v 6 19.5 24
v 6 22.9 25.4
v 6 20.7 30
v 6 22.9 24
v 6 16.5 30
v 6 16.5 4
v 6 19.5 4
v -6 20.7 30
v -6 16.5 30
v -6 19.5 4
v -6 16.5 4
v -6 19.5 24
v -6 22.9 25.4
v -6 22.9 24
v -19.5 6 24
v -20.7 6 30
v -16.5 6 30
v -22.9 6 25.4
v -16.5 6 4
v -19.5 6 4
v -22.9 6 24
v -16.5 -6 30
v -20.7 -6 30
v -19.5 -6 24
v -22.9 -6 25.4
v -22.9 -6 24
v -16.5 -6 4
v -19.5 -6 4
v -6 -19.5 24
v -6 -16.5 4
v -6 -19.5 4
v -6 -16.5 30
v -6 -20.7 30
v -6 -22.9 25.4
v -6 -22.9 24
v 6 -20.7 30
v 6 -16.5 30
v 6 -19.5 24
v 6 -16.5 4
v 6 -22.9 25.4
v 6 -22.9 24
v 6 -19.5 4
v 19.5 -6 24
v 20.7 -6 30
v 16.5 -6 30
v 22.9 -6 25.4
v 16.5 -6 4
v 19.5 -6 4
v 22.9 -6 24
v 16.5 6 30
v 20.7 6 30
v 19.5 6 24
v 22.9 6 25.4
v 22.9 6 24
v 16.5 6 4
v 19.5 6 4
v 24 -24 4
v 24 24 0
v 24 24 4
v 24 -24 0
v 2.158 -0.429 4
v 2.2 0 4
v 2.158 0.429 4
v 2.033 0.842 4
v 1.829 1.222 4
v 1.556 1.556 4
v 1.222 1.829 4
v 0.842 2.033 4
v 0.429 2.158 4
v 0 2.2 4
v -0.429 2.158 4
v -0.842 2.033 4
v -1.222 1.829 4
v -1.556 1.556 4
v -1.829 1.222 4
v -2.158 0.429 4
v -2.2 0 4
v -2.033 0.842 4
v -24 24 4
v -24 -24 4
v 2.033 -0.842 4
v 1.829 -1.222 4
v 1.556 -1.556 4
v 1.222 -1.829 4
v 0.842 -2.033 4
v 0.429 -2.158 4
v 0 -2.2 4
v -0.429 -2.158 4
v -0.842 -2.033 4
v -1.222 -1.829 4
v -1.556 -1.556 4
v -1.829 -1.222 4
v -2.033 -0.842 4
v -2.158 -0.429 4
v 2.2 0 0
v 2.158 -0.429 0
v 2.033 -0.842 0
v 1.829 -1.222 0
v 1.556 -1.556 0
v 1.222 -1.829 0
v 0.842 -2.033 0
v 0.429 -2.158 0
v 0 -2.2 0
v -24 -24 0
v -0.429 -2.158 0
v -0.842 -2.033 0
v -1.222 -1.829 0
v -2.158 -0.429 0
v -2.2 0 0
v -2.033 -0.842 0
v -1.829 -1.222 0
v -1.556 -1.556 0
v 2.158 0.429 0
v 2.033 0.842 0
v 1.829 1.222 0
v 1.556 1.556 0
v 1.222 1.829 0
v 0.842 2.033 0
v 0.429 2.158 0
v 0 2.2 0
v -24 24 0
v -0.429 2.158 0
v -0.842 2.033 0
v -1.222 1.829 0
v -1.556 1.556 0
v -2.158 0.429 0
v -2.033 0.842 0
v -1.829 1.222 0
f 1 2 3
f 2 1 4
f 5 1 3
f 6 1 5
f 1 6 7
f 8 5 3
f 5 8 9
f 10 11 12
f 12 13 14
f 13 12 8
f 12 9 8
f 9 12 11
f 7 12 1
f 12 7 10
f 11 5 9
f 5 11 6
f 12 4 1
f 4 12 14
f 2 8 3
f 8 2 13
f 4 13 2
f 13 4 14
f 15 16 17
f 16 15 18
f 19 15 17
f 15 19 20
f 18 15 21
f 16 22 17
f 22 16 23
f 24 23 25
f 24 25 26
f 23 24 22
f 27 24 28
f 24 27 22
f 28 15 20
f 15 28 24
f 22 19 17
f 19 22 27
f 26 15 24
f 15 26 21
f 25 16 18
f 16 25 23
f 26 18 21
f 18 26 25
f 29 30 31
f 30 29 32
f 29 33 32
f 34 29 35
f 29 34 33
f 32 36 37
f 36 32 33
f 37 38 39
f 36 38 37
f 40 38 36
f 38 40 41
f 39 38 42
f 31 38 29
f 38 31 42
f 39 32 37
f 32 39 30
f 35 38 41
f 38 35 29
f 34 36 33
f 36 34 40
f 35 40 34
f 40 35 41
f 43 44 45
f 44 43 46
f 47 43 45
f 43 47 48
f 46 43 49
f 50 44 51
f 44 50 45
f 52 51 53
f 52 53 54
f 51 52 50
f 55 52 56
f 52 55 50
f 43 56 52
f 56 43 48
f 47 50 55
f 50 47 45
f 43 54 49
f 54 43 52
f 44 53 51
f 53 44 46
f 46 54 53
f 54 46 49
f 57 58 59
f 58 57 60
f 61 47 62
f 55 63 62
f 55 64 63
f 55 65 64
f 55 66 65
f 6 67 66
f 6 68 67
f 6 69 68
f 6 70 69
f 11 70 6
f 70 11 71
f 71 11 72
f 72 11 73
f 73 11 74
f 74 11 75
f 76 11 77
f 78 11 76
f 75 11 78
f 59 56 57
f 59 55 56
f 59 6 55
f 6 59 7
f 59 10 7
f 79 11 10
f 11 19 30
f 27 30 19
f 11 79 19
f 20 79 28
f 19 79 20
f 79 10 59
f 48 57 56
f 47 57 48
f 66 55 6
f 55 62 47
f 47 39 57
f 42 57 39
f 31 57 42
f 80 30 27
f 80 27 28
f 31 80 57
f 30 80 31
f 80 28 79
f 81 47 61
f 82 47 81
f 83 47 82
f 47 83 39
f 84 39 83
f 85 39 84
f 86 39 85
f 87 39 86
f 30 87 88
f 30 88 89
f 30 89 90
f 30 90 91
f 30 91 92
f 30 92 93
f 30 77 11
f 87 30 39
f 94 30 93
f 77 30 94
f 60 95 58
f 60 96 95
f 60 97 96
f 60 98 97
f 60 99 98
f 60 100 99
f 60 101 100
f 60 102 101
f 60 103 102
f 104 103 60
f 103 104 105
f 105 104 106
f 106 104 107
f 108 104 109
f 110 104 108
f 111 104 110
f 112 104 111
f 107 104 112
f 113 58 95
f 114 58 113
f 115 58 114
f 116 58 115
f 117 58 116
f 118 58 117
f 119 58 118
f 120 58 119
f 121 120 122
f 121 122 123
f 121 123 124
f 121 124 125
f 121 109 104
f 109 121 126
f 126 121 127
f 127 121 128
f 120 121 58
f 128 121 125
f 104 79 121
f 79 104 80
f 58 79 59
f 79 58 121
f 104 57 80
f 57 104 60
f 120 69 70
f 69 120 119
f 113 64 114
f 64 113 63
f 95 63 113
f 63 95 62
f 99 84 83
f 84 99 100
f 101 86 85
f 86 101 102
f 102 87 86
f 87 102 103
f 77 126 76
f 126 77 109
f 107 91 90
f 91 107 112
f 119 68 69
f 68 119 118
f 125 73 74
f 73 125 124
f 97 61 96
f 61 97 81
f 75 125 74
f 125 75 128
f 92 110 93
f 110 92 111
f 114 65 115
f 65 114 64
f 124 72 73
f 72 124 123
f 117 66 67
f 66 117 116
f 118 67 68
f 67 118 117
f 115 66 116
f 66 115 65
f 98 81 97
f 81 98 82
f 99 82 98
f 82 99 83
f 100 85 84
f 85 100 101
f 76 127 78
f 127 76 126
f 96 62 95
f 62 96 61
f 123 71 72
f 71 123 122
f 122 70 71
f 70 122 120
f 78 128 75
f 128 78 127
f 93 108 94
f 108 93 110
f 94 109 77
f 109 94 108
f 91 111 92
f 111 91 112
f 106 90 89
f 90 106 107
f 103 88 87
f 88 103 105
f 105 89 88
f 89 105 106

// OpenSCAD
$fn = 32;

// ----------------------------------------------------------------------
// Snap-fit latch: 4 arms, 26 mm tall, 3.6 mm undercut hooks
// ----------------------------------------------------------------------

// --- parameters (mm) ---
base_d = 48;              // base plate depth
base_h = 4;               // base plate thickness
span = 36;                // distance between opposite arms
arm_t = 3;                // arm thickness
arm_d = 12;               // arm width
height = 26;              // free arm length
head_len = 3.6;           // hook reach
head_h = 6;               // hook height
lead = 1.4;               // lead-in ramp thickness
bore_d = 4.4;             // base fixing bore
top_z = 30;               // height of the arm tips above the base

arms = 4;

difference() {
  union() {
    /* base plate, centred on the arm ring */
    translate([-24, -24, 0]) cube([base_d, base_d, base_h]);
    for (a = [0 : 360 / arms : 359]) rotate([0, 0, a]) {
    /* arm, sunk 0.5 mm into the base */
    translate([-arm_d / 2, span / 2 - arm_t / 2, base_h - 0.5]) cube([arm_d, arm_t, height + 0.5]);
    /* hook: a convex hull of a tall inner block and a thin outer lip
       gives a flat undercut below and a lead-in ramp on top */
    hull() {
      translate([-arm_d / 2, span / 2 + arm_t / 2 - 0.6, top_z - head_h]) cube([arm_d, lead + 0.4, head_h]);
      translate([-arm_d / 2, span / 2 + arm_t / 2 - 0.2, top_z - head_h]) cube([arm_d, head_len, lead]);
    }
    }
  }
  translate([0, 0, -2.5]) cylinder(h = base_h + 5, d = bore_d);
}
